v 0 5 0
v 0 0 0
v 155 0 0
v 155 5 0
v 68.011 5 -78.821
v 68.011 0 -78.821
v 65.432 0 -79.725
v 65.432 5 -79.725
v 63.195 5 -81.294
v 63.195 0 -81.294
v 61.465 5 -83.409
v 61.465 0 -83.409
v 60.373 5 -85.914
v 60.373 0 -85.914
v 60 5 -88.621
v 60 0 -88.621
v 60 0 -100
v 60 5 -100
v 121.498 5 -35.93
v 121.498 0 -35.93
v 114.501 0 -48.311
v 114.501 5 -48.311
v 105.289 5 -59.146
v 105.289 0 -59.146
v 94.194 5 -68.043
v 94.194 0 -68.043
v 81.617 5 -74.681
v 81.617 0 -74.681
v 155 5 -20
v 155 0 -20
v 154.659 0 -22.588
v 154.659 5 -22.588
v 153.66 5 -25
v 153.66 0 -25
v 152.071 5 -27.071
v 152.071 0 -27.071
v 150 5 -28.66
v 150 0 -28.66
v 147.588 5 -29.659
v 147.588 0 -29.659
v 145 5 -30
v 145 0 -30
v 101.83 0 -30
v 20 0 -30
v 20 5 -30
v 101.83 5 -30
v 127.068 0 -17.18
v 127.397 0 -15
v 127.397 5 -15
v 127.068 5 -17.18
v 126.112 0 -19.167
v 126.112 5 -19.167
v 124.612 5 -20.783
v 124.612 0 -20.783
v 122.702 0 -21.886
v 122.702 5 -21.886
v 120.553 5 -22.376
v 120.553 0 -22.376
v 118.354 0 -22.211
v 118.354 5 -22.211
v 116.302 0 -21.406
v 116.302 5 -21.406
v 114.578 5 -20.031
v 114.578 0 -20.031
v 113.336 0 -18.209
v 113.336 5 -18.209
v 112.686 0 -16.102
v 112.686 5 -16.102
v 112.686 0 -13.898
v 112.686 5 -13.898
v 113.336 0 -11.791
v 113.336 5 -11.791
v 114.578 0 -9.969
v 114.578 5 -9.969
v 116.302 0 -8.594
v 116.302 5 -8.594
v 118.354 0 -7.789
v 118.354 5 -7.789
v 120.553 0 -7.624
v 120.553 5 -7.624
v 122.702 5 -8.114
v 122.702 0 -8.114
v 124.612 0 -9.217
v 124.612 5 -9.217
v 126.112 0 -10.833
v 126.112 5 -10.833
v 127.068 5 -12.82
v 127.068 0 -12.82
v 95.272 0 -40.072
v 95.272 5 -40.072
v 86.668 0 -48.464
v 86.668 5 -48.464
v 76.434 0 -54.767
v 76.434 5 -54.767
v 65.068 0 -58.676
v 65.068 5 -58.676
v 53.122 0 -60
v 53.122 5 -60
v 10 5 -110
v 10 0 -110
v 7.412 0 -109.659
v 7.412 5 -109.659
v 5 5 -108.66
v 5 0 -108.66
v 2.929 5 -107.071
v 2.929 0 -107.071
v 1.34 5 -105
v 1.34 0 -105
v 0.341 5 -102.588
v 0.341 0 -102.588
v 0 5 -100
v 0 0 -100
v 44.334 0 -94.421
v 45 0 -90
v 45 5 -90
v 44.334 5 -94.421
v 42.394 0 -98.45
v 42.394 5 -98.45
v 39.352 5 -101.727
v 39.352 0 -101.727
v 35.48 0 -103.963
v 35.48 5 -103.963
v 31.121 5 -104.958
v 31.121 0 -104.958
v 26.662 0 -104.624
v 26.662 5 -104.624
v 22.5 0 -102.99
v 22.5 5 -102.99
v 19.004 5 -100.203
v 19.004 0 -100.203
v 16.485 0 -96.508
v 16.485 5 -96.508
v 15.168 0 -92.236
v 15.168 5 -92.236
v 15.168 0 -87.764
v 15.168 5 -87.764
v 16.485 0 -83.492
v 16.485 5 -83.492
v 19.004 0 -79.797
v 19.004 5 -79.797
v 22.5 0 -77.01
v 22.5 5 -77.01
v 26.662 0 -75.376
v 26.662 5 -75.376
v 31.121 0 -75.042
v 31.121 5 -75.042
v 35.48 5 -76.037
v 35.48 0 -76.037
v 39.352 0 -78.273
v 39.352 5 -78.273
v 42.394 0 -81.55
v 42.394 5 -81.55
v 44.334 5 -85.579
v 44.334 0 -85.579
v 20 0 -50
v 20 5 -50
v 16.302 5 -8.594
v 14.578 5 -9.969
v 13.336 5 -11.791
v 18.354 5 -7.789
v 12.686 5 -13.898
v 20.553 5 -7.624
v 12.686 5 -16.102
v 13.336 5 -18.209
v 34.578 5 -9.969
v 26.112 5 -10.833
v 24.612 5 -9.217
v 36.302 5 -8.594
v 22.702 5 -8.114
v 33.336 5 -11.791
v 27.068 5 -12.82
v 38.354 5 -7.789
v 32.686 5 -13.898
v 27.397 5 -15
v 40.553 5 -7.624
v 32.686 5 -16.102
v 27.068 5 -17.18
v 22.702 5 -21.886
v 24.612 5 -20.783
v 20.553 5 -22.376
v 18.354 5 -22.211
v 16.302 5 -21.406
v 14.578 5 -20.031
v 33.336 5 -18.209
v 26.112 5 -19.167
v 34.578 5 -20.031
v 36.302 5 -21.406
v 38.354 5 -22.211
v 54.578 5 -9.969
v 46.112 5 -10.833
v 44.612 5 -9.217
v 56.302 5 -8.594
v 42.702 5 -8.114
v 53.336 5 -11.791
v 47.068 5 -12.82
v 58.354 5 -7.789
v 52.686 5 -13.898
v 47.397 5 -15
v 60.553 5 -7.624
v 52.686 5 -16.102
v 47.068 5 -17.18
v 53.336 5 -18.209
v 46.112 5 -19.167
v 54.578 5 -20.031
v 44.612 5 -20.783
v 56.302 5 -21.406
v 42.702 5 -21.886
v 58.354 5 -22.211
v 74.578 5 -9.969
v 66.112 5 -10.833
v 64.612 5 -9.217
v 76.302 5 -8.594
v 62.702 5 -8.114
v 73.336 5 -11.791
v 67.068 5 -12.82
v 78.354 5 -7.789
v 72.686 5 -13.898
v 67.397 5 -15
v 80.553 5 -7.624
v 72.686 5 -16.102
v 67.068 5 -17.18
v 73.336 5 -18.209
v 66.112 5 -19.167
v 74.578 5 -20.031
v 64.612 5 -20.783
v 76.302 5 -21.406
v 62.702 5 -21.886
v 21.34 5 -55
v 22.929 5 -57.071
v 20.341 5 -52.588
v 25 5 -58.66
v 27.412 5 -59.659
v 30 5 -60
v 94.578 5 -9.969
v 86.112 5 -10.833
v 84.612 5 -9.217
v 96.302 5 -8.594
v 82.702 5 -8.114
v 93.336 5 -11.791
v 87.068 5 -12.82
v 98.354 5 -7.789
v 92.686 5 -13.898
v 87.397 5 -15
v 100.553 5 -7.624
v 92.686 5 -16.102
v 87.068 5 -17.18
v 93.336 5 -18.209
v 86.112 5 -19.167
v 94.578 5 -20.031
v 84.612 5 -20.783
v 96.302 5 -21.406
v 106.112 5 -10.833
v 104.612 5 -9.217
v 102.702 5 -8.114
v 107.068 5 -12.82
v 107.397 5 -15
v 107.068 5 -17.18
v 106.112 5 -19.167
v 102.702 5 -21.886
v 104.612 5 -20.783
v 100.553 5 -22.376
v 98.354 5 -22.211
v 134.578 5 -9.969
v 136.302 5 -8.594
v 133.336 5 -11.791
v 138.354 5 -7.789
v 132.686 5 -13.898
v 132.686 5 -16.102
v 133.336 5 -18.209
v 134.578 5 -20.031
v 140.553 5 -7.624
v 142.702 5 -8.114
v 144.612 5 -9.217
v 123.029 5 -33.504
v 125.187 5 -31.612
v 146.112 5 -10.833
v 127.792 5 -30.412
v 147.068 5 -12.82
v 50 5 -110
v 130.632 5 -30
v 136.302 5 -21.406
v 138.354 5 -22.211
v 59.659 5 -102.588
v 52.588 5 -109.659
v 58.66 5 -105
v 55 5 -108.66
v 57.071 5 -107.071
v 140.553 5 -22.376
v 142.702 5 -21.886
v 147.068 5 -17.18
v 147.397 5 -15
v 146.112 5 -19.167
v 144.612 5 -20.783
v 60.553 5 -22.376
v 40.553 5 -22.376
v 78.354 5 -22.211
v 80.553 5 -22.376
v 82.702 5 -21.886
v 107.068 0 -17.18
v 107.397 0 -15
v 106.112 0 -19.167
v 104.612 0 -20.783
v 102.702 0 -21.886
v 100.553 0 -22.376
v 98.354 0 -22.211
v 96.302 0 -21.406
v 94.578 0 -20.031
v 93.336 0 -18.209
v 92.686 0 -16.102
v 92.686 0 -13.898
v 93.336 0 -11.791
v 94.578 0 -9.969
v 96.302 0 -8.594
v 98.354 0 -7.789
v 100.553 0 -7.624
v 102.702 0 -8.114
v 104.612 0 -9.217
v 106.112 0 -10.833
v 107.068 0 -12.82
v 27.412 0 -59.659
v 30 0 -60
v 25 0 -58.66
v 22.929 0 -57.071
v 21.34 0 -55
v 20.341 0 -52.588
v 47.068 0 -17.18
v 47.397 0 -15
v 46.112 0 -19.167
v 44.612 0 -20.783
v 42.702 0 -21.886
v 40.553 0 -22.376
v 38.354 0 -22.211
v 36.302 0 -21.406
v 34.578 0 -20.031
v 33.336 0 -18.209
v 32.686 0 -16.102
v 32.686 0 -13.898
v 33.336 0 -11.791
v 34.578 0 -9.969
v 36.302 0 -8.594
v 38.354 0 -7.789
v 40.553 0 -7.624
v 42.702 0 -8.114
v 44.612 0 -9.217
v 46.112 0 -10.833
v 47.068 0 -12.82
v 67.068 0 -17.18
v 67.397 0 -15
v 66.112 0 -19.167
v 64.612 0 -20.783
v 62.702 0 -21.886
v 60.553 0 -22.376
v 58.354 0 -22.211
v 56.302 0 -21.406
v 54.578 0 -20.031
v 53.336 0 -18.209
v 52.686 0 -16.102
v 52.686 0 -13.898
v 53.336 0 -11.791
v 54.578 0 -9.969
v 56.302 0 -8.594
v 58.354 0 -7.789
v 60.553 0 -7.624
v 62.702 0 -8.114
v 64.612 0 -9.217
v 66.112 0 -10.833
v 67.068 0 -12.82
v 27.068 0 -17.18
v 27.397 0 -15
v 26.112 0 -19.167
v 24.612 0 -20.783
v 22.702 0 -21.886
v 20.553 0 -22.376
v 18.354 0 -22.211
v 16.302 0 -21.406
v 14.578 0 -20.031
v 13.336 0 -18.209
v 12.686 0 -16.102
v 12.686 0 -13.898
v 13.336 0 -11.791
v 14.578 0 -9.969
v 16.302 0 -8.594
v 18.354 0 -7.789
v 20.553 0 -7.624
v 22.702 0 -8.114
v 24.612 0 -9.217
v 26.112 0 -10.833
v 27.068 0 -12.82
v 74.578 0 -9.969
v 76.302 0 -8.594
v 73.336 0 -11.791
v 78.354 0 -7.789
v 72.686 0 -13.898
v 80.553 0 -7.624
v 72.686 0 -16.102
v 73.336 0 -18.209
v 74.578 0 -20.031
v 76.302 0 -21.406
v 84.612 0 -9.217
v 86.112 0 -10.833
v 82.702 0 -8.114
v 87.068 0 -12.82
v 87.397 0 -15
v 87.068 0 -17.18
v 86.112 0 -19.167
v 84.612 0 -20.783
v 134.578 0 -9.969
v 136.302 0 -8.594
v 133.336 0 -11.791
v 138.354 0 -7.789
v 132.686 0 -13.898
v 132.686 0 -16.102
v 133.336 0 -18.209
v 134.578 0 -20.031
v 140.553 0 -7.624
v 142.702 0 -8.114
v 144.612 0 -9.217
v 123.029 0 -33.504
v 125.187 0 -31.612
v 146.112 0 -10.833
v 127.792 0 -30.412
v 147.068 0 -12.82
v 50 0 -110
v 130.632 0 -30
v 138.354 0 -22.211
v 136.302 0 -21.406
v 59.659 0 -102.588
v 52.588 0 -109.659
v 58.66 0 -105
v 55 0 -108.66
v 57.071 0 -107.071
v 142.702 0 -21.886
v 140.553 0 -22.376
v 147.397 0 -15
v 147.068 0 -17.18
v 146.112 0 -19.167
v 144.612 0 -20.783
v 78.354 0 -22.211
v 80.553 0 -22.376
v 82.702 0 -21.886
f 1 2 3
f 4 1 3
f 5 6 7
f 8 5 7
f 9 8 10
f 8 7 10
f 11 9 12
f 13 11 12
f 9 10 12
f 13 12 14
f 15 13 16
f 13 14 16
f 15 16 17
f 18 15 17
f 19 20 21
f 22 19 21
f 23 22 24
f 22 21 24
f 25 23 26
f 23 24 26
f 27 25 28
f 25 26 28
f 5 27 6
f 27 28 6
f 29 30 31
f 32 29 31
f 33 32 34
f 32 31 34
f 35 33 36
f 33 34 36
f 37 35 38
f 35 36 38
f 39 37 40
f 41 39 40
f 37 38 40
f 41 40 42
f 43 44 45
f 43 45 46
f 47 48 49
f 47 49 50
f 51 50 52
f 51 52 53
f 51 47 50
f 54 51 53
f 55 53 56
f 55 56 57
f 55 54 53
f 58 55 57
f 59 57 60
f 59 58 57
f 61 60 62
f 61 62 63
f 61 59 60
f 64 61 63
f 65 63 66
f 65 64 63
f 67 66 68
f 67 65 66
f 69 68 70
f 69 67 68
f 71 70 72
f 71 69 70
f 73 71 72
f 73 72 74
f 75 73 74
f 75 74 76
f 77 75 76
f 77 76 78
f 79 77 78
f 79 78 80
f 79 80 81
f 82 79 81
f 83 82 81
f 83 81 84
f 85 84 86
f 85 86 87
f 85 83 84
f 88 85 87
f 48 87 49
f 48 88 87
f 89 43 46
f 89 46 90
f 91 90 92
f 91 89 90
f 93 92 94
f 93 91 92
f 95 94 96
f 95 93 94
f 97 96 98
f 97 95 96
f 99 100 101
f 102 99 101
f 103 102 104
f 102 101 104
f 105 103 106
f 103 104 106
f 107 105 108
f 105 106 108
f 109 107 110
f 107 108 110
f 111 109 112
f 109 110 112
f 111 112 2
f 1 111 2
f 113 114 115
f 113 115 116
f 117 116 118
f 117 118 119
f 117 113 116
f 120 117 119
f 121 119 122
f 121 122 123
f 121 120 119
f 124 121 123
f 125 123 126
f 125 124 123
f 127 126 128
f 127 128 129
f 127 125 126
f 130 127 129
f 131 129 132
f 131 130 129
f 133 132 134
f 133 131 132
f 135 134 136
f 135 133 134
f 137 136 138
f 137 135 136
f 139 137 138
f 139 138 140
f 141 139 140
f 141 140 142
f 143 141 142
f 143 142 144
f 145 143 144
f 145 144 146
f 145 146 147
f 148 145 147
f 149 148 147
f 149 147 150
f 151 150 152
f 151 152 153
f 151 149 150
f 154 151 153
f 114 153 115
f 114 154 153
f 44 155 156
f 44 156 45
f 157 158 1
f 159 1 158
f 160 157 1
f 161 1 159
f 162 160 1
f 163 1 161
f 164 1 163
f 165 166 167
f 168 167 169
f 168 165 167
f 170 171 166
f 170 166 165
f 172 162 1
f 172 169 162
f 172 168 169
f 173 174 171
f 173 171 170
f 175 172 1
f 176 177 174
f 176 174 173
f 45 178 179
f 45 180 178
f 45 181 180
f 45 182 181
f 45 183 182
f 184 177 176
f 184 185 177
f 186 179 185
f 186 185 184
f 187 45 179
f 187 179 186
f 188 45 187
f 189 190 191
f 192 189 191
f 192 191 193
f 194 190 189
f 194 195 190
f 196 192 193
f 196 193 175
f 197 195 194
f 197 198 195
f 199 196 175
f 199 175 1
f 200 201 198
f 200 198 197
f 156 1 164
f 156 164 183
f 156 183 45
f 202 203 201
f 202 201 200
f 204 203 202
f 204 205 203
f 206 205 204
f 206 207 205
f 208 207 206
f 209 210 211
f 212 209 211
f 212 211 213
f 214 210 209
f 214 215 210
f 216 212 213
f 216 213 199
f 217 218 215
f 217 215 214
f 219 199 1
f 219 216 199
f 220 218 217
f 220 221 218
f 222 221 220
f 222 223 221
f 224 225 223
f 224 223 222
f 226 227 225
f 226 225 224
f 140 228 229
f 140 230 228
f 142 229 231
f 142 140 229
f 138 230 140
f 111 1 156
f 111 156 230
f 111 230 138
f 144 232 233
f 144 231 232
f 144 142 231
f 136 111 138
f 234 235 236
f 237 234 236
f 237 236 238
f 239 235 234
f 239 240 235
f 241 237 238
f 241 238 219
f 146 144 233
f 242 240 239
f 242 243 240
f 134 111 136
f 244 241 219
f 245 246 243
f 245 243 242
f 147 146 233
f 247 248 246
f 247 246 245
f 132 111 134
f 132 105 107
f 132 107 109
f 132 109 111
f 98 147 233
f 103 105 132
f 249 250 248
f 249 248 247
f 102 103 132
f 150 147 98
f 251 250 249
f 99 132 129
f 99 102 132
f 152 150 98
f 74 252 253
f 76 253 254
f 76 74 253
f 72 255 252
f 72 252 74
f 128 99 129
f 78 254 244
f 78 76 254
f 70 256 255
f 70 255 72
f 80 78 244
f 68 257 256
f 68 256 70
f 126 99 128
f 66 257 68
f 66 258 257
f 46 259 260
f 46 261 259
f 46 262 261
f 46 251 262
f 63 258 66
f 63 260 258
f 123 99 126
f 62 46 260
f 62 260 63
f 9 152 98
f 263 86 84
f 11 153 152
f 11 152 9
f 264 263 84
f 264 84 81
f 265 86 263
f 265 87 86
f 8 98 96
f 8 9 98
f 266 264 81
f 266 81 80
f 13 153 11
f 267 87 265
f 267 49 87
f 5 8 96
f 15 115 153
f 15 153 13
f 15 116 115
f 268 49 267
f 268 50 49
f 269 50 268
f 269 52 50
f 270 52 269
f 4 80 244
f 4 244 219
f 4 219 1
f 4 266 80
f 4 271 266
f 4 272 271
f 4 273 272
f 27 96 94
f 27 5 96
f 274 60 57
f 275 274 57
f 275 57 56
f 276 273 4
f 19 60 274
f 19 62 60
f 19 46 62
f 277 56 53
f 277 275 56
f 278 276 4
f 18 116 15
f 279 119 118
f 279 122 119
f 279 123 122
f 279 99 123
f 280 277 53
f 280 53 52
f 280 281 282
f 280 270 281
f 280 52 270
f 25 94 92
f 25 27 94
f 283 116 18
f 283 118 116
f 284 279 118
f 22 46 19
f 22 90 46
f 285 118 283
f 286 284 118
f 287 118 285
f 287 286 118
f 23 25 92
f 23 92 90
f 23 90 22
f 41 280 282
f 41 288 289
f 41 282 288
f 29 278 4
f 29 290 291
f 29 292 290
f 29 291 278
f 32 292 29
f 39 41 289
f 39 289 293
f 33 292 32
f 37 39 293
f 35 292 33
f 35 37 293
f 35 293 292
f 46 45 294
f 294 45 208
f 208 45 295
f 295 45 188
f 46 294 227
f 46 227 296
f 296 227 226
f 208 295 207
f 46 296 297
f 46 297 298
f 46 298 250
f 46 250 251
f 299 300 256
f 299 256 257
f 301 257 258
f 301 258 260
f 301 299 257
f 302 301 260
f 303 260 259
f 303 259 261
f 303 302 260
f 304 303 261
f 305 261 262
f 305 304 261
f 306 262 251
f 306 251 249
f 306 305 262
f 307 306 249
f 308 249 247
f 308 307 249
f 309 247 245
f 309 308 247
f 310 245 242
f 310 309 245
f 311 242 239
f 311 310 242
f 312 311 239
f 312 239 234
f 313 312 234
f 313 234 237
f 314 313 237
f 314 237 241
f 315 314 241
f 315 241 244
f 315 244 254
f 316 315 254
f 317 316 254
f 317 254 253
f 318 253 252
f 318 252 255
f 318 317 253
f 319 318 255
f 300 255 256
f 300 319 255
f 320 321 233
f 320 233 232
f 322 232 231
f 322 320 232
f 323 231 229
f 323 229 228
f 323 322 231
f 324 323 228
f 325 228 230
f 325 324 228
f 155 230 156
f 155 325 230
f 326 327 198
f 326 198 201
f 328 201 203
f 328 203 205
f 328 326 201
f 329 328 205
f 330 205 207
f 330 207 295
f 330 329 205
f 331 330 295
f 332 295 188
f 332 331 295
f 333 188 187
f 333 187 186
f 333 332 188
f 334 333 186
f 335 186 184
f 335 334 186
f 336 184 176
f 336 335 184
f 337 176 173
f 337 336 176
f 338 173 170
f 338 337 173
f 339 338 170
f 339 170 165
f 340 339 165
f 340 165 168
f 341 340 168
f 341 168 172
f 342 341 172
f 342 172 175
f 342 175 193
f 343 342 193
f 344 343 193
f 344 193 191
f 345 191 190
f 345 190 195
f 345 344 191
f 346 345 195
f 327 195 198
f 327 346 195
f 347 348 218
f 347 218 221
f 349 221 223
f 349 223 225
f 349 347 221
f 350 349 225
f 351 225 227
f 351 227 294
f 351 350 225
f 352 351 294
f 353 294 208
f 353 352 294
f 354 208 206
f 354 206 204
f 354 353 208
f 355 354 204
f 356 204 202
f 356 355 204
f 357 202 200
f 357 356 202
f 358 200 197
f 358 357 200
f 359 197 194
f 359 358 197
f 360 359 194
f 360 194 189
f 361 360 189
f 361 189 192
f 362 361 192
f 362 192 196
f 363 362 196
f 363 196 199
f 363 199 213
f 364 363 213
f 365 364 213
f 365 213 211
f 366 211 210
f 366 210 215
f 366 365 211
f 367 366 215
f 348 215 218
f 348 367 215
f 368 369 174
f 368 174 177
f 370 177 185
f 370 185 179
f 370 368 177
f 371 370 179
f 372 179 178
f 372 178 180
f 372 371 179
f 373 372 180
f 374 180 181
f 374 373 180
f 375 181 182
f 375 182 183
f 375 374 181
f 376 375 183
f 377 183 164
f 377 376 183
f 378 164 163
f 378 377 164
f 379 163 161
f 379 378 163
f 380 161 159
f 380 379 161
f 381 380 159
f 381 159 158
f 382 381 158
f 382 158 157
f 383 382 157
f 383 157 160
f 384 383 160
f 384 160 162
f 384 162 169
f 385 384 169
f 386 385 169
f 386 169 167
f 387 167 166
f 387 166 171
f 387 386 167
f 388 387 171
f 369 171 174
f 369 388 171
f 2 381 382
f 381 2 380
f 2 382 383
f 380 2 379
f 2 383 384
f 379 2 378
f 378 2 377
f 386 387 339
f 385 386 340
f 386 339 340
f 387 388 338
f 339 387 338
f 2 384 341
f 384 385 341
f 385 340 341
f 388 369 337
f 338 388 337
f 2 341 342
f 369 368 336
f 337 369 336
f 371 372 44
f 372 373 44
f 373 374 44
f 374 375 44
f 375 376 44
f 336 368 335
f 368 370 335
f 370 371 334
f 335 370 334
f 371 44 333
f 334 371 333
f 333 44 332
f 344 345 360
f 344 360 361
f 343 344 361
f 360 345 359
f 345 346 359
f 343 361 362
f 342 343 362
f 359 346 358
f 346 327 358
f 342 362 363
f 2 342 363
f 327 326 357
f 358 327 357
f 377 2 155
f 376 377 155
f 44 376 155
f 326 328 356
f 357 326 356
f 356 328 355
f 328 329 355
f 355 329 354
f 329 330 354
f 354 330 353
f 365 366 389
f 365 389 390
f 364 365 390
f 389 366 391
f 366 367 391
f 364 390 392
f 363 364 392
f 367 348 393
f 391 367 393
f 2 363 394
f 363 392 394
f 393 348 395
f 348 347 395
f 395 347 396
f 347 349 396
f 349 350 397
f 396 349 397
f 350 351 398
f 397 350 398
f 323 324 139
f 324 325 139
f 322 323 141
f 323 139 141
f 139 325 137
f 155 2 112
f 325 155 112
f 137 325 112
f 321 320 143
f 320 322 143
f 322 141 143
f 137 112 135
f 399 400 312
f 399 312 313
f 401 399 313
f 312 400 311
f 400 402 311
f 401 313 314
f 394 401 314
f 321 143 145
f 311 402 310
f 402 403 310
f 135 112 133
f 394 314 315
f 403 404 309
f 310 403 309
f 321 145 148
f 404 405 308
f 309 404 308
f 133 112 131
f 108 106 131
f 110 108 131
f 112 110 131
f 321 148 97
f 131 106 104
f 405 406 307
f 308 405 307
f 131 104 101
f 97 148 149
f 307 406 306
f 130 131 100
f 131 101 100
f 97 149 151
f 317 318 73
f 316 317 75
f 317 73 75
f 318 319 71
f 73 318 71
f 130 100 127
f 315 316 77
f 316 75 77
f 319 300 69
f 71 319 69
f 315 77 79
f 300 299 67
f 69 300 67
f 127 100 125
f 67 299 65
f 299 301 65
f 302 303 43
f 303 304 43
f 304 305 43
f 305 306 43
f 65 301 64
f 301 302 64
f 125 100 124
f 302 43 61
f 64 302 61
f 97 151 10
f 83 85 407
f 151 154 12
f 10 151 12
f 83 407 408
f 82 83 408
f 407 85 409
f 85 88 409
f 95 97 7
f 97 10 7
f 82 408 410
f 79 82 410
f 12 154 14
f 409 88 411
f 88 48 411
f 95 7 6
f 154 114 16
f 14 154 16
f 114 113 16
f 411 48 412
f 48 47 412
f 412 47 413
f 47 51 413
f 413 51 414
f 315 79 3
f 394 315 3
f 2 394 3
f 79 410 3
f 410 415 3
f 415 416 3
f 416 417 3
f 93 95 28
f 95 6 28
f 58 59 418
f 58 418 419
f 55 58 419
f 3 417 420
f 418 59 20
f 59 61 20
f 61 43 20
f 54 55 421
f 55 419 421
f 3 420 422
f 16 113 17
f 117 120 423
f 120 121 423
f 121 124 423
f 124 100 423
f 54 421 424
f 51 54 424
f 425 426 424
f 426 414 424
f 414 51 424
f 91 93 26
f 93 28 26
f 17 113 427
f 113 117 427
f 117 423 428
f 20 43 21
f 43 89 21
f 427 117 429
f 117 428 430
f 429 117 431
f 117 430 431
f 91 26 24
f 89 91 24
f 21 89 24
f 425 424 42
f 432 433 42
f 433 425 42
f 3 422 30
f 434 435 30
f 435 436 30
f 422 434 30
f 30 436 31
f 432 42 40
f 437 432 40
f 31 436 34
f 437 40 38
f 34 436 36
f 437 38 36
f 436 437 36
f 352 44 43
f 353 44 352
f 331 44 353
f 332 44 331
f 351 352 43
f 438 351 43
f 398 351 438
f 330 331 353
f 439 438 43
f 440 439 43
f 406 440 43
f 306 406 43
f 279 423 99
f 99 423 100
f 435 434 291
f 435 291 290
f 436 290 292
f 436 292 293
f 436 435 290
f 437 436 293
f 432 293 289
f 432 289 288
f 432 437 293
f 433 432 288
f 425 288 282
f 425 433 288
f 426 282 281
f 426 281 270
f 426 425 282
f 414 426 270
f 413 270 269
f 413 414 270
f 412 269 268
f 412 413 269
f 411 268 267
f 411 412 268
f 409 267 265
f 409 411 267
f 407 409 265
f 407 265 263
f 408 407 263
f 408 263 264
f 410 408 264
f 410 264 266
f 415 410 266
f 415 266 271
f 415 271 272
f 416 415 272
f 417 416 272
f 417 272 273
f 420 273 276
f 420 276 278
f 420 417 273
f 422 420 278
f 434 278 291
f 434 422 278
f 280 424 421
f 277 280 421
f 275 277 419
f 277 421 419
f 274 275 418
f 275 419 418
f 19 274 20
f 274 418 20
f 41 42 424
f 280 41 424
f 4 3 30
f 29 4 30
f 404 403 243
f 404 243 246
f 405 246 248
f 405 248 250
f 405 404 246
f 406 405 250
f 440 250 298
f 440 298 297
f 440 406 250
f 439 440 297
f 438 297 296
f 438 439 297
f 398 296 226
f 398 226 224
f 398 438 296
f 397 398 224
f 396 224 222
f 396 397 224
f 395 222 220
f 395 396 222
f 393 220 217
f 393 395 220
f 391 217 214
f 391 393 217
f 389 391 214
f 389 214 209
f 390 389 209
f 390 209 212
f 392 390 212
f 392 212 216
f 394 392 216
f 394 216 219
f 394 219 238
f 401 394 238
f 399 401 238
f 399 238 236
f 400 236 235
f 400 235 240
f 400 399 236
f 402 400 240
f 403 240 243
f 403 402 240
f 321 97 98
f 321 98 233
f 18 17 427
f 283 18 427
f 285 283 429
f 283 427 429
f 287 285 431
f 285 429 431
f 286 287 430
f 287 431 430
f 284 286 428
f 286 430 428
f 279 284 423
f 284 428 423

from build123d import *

# Parameters (mm, degrees)
SKETCH1_R           = 15
SKETCH1_R_2         = 7.396823718
BOSS_EXTRUDE1_DEPTH = 5


with BuildPart() as part:
    # Sketch1 → Boss-Extrude1 (new body)
    with BuildSketch(Plane(origin=(0, 0, 0), x_dir=(1, 0, 0), z_dir=(0, 1, 0))):
        with BuildLine():
            Line((155, 0), (155, 20))
            ThreePointArc((155, 20), (152.071067812, 27.071067812), (145, 30))
            Line((145, 30), (130.631756617, 30))
            ThreePointArc((130.631756617, 30), (125.186785887, 31.612372579), (121.497679457, 35.929541251))
            ThreePointArc((121.497679457, 35.929541251), (99.953355799, 63.858544428), (68.011045902, 78.821028806))
            ThreePointArc((68.011045902, 78.821028806), (62.257599178, 82.292315938), (60, 88.621236029))
            Line((60, 88.621236029), (60, 100))
            ThreePointArc((60, 100), (57.071067812, 107.071067812), (50, 110))
            Line((50, 110), (10, 110))
            ThreePointArc((10, 110), (2.928932188, 107.071067812), (0, 100))
            Line((0, 100), (0, 0))
            Line((0, 0), (155, 0))
        make_face()
        with Locations((30, 90)):
            Circle(SKETCH1_R, mode=Mode.SUBTRACT)
        with Locations((20, 15)):
            Circle(SKETCH1_R_2, mode=Mode.SUBTRACT)
        with Locations((40, 15)):
            Circle(SKETCH1_R_2, mode=Mode.SUBTRACT)
        with Locations((60, 15)):
            Circle(SKETCH1_R_2, mode=Mode.SUBTRACT)
        with Locations((80, 15)):
            Circle(SKETCH1_R_2, mode=Mode.SUBTRACT)
        with Locations((100, 15)):
            Circle(SKETCH1_R_2, mode=Mode.SUBTRACT)
        with Locations((120, 15)):
            Circle(SKETCH1_R_2, mode=Mode.SUBTRACT)
        with Locations((140, 15)):
            Circle(SKETCH1_R_2, mode=Mode.SUBTRACT)
        with BuildLine():
            ThreePointArc((30, 60), (22.928932188, 57.071067812), (20, 50))
            Line((20, 50), (20, 30))
            Line((20, 30), (101.830075275, 30))
            ThreePointArc((101.830075275, 30), (81.724911294, 51.898267594), (53.122224807, 60))
            Line((53.122224807, 60), (30, 60))
        make_face(mode=Mode.SUBTRACT)
    extrude(amount=BOSS_EXTRUDE1_DEPTH)


solid = part.part
